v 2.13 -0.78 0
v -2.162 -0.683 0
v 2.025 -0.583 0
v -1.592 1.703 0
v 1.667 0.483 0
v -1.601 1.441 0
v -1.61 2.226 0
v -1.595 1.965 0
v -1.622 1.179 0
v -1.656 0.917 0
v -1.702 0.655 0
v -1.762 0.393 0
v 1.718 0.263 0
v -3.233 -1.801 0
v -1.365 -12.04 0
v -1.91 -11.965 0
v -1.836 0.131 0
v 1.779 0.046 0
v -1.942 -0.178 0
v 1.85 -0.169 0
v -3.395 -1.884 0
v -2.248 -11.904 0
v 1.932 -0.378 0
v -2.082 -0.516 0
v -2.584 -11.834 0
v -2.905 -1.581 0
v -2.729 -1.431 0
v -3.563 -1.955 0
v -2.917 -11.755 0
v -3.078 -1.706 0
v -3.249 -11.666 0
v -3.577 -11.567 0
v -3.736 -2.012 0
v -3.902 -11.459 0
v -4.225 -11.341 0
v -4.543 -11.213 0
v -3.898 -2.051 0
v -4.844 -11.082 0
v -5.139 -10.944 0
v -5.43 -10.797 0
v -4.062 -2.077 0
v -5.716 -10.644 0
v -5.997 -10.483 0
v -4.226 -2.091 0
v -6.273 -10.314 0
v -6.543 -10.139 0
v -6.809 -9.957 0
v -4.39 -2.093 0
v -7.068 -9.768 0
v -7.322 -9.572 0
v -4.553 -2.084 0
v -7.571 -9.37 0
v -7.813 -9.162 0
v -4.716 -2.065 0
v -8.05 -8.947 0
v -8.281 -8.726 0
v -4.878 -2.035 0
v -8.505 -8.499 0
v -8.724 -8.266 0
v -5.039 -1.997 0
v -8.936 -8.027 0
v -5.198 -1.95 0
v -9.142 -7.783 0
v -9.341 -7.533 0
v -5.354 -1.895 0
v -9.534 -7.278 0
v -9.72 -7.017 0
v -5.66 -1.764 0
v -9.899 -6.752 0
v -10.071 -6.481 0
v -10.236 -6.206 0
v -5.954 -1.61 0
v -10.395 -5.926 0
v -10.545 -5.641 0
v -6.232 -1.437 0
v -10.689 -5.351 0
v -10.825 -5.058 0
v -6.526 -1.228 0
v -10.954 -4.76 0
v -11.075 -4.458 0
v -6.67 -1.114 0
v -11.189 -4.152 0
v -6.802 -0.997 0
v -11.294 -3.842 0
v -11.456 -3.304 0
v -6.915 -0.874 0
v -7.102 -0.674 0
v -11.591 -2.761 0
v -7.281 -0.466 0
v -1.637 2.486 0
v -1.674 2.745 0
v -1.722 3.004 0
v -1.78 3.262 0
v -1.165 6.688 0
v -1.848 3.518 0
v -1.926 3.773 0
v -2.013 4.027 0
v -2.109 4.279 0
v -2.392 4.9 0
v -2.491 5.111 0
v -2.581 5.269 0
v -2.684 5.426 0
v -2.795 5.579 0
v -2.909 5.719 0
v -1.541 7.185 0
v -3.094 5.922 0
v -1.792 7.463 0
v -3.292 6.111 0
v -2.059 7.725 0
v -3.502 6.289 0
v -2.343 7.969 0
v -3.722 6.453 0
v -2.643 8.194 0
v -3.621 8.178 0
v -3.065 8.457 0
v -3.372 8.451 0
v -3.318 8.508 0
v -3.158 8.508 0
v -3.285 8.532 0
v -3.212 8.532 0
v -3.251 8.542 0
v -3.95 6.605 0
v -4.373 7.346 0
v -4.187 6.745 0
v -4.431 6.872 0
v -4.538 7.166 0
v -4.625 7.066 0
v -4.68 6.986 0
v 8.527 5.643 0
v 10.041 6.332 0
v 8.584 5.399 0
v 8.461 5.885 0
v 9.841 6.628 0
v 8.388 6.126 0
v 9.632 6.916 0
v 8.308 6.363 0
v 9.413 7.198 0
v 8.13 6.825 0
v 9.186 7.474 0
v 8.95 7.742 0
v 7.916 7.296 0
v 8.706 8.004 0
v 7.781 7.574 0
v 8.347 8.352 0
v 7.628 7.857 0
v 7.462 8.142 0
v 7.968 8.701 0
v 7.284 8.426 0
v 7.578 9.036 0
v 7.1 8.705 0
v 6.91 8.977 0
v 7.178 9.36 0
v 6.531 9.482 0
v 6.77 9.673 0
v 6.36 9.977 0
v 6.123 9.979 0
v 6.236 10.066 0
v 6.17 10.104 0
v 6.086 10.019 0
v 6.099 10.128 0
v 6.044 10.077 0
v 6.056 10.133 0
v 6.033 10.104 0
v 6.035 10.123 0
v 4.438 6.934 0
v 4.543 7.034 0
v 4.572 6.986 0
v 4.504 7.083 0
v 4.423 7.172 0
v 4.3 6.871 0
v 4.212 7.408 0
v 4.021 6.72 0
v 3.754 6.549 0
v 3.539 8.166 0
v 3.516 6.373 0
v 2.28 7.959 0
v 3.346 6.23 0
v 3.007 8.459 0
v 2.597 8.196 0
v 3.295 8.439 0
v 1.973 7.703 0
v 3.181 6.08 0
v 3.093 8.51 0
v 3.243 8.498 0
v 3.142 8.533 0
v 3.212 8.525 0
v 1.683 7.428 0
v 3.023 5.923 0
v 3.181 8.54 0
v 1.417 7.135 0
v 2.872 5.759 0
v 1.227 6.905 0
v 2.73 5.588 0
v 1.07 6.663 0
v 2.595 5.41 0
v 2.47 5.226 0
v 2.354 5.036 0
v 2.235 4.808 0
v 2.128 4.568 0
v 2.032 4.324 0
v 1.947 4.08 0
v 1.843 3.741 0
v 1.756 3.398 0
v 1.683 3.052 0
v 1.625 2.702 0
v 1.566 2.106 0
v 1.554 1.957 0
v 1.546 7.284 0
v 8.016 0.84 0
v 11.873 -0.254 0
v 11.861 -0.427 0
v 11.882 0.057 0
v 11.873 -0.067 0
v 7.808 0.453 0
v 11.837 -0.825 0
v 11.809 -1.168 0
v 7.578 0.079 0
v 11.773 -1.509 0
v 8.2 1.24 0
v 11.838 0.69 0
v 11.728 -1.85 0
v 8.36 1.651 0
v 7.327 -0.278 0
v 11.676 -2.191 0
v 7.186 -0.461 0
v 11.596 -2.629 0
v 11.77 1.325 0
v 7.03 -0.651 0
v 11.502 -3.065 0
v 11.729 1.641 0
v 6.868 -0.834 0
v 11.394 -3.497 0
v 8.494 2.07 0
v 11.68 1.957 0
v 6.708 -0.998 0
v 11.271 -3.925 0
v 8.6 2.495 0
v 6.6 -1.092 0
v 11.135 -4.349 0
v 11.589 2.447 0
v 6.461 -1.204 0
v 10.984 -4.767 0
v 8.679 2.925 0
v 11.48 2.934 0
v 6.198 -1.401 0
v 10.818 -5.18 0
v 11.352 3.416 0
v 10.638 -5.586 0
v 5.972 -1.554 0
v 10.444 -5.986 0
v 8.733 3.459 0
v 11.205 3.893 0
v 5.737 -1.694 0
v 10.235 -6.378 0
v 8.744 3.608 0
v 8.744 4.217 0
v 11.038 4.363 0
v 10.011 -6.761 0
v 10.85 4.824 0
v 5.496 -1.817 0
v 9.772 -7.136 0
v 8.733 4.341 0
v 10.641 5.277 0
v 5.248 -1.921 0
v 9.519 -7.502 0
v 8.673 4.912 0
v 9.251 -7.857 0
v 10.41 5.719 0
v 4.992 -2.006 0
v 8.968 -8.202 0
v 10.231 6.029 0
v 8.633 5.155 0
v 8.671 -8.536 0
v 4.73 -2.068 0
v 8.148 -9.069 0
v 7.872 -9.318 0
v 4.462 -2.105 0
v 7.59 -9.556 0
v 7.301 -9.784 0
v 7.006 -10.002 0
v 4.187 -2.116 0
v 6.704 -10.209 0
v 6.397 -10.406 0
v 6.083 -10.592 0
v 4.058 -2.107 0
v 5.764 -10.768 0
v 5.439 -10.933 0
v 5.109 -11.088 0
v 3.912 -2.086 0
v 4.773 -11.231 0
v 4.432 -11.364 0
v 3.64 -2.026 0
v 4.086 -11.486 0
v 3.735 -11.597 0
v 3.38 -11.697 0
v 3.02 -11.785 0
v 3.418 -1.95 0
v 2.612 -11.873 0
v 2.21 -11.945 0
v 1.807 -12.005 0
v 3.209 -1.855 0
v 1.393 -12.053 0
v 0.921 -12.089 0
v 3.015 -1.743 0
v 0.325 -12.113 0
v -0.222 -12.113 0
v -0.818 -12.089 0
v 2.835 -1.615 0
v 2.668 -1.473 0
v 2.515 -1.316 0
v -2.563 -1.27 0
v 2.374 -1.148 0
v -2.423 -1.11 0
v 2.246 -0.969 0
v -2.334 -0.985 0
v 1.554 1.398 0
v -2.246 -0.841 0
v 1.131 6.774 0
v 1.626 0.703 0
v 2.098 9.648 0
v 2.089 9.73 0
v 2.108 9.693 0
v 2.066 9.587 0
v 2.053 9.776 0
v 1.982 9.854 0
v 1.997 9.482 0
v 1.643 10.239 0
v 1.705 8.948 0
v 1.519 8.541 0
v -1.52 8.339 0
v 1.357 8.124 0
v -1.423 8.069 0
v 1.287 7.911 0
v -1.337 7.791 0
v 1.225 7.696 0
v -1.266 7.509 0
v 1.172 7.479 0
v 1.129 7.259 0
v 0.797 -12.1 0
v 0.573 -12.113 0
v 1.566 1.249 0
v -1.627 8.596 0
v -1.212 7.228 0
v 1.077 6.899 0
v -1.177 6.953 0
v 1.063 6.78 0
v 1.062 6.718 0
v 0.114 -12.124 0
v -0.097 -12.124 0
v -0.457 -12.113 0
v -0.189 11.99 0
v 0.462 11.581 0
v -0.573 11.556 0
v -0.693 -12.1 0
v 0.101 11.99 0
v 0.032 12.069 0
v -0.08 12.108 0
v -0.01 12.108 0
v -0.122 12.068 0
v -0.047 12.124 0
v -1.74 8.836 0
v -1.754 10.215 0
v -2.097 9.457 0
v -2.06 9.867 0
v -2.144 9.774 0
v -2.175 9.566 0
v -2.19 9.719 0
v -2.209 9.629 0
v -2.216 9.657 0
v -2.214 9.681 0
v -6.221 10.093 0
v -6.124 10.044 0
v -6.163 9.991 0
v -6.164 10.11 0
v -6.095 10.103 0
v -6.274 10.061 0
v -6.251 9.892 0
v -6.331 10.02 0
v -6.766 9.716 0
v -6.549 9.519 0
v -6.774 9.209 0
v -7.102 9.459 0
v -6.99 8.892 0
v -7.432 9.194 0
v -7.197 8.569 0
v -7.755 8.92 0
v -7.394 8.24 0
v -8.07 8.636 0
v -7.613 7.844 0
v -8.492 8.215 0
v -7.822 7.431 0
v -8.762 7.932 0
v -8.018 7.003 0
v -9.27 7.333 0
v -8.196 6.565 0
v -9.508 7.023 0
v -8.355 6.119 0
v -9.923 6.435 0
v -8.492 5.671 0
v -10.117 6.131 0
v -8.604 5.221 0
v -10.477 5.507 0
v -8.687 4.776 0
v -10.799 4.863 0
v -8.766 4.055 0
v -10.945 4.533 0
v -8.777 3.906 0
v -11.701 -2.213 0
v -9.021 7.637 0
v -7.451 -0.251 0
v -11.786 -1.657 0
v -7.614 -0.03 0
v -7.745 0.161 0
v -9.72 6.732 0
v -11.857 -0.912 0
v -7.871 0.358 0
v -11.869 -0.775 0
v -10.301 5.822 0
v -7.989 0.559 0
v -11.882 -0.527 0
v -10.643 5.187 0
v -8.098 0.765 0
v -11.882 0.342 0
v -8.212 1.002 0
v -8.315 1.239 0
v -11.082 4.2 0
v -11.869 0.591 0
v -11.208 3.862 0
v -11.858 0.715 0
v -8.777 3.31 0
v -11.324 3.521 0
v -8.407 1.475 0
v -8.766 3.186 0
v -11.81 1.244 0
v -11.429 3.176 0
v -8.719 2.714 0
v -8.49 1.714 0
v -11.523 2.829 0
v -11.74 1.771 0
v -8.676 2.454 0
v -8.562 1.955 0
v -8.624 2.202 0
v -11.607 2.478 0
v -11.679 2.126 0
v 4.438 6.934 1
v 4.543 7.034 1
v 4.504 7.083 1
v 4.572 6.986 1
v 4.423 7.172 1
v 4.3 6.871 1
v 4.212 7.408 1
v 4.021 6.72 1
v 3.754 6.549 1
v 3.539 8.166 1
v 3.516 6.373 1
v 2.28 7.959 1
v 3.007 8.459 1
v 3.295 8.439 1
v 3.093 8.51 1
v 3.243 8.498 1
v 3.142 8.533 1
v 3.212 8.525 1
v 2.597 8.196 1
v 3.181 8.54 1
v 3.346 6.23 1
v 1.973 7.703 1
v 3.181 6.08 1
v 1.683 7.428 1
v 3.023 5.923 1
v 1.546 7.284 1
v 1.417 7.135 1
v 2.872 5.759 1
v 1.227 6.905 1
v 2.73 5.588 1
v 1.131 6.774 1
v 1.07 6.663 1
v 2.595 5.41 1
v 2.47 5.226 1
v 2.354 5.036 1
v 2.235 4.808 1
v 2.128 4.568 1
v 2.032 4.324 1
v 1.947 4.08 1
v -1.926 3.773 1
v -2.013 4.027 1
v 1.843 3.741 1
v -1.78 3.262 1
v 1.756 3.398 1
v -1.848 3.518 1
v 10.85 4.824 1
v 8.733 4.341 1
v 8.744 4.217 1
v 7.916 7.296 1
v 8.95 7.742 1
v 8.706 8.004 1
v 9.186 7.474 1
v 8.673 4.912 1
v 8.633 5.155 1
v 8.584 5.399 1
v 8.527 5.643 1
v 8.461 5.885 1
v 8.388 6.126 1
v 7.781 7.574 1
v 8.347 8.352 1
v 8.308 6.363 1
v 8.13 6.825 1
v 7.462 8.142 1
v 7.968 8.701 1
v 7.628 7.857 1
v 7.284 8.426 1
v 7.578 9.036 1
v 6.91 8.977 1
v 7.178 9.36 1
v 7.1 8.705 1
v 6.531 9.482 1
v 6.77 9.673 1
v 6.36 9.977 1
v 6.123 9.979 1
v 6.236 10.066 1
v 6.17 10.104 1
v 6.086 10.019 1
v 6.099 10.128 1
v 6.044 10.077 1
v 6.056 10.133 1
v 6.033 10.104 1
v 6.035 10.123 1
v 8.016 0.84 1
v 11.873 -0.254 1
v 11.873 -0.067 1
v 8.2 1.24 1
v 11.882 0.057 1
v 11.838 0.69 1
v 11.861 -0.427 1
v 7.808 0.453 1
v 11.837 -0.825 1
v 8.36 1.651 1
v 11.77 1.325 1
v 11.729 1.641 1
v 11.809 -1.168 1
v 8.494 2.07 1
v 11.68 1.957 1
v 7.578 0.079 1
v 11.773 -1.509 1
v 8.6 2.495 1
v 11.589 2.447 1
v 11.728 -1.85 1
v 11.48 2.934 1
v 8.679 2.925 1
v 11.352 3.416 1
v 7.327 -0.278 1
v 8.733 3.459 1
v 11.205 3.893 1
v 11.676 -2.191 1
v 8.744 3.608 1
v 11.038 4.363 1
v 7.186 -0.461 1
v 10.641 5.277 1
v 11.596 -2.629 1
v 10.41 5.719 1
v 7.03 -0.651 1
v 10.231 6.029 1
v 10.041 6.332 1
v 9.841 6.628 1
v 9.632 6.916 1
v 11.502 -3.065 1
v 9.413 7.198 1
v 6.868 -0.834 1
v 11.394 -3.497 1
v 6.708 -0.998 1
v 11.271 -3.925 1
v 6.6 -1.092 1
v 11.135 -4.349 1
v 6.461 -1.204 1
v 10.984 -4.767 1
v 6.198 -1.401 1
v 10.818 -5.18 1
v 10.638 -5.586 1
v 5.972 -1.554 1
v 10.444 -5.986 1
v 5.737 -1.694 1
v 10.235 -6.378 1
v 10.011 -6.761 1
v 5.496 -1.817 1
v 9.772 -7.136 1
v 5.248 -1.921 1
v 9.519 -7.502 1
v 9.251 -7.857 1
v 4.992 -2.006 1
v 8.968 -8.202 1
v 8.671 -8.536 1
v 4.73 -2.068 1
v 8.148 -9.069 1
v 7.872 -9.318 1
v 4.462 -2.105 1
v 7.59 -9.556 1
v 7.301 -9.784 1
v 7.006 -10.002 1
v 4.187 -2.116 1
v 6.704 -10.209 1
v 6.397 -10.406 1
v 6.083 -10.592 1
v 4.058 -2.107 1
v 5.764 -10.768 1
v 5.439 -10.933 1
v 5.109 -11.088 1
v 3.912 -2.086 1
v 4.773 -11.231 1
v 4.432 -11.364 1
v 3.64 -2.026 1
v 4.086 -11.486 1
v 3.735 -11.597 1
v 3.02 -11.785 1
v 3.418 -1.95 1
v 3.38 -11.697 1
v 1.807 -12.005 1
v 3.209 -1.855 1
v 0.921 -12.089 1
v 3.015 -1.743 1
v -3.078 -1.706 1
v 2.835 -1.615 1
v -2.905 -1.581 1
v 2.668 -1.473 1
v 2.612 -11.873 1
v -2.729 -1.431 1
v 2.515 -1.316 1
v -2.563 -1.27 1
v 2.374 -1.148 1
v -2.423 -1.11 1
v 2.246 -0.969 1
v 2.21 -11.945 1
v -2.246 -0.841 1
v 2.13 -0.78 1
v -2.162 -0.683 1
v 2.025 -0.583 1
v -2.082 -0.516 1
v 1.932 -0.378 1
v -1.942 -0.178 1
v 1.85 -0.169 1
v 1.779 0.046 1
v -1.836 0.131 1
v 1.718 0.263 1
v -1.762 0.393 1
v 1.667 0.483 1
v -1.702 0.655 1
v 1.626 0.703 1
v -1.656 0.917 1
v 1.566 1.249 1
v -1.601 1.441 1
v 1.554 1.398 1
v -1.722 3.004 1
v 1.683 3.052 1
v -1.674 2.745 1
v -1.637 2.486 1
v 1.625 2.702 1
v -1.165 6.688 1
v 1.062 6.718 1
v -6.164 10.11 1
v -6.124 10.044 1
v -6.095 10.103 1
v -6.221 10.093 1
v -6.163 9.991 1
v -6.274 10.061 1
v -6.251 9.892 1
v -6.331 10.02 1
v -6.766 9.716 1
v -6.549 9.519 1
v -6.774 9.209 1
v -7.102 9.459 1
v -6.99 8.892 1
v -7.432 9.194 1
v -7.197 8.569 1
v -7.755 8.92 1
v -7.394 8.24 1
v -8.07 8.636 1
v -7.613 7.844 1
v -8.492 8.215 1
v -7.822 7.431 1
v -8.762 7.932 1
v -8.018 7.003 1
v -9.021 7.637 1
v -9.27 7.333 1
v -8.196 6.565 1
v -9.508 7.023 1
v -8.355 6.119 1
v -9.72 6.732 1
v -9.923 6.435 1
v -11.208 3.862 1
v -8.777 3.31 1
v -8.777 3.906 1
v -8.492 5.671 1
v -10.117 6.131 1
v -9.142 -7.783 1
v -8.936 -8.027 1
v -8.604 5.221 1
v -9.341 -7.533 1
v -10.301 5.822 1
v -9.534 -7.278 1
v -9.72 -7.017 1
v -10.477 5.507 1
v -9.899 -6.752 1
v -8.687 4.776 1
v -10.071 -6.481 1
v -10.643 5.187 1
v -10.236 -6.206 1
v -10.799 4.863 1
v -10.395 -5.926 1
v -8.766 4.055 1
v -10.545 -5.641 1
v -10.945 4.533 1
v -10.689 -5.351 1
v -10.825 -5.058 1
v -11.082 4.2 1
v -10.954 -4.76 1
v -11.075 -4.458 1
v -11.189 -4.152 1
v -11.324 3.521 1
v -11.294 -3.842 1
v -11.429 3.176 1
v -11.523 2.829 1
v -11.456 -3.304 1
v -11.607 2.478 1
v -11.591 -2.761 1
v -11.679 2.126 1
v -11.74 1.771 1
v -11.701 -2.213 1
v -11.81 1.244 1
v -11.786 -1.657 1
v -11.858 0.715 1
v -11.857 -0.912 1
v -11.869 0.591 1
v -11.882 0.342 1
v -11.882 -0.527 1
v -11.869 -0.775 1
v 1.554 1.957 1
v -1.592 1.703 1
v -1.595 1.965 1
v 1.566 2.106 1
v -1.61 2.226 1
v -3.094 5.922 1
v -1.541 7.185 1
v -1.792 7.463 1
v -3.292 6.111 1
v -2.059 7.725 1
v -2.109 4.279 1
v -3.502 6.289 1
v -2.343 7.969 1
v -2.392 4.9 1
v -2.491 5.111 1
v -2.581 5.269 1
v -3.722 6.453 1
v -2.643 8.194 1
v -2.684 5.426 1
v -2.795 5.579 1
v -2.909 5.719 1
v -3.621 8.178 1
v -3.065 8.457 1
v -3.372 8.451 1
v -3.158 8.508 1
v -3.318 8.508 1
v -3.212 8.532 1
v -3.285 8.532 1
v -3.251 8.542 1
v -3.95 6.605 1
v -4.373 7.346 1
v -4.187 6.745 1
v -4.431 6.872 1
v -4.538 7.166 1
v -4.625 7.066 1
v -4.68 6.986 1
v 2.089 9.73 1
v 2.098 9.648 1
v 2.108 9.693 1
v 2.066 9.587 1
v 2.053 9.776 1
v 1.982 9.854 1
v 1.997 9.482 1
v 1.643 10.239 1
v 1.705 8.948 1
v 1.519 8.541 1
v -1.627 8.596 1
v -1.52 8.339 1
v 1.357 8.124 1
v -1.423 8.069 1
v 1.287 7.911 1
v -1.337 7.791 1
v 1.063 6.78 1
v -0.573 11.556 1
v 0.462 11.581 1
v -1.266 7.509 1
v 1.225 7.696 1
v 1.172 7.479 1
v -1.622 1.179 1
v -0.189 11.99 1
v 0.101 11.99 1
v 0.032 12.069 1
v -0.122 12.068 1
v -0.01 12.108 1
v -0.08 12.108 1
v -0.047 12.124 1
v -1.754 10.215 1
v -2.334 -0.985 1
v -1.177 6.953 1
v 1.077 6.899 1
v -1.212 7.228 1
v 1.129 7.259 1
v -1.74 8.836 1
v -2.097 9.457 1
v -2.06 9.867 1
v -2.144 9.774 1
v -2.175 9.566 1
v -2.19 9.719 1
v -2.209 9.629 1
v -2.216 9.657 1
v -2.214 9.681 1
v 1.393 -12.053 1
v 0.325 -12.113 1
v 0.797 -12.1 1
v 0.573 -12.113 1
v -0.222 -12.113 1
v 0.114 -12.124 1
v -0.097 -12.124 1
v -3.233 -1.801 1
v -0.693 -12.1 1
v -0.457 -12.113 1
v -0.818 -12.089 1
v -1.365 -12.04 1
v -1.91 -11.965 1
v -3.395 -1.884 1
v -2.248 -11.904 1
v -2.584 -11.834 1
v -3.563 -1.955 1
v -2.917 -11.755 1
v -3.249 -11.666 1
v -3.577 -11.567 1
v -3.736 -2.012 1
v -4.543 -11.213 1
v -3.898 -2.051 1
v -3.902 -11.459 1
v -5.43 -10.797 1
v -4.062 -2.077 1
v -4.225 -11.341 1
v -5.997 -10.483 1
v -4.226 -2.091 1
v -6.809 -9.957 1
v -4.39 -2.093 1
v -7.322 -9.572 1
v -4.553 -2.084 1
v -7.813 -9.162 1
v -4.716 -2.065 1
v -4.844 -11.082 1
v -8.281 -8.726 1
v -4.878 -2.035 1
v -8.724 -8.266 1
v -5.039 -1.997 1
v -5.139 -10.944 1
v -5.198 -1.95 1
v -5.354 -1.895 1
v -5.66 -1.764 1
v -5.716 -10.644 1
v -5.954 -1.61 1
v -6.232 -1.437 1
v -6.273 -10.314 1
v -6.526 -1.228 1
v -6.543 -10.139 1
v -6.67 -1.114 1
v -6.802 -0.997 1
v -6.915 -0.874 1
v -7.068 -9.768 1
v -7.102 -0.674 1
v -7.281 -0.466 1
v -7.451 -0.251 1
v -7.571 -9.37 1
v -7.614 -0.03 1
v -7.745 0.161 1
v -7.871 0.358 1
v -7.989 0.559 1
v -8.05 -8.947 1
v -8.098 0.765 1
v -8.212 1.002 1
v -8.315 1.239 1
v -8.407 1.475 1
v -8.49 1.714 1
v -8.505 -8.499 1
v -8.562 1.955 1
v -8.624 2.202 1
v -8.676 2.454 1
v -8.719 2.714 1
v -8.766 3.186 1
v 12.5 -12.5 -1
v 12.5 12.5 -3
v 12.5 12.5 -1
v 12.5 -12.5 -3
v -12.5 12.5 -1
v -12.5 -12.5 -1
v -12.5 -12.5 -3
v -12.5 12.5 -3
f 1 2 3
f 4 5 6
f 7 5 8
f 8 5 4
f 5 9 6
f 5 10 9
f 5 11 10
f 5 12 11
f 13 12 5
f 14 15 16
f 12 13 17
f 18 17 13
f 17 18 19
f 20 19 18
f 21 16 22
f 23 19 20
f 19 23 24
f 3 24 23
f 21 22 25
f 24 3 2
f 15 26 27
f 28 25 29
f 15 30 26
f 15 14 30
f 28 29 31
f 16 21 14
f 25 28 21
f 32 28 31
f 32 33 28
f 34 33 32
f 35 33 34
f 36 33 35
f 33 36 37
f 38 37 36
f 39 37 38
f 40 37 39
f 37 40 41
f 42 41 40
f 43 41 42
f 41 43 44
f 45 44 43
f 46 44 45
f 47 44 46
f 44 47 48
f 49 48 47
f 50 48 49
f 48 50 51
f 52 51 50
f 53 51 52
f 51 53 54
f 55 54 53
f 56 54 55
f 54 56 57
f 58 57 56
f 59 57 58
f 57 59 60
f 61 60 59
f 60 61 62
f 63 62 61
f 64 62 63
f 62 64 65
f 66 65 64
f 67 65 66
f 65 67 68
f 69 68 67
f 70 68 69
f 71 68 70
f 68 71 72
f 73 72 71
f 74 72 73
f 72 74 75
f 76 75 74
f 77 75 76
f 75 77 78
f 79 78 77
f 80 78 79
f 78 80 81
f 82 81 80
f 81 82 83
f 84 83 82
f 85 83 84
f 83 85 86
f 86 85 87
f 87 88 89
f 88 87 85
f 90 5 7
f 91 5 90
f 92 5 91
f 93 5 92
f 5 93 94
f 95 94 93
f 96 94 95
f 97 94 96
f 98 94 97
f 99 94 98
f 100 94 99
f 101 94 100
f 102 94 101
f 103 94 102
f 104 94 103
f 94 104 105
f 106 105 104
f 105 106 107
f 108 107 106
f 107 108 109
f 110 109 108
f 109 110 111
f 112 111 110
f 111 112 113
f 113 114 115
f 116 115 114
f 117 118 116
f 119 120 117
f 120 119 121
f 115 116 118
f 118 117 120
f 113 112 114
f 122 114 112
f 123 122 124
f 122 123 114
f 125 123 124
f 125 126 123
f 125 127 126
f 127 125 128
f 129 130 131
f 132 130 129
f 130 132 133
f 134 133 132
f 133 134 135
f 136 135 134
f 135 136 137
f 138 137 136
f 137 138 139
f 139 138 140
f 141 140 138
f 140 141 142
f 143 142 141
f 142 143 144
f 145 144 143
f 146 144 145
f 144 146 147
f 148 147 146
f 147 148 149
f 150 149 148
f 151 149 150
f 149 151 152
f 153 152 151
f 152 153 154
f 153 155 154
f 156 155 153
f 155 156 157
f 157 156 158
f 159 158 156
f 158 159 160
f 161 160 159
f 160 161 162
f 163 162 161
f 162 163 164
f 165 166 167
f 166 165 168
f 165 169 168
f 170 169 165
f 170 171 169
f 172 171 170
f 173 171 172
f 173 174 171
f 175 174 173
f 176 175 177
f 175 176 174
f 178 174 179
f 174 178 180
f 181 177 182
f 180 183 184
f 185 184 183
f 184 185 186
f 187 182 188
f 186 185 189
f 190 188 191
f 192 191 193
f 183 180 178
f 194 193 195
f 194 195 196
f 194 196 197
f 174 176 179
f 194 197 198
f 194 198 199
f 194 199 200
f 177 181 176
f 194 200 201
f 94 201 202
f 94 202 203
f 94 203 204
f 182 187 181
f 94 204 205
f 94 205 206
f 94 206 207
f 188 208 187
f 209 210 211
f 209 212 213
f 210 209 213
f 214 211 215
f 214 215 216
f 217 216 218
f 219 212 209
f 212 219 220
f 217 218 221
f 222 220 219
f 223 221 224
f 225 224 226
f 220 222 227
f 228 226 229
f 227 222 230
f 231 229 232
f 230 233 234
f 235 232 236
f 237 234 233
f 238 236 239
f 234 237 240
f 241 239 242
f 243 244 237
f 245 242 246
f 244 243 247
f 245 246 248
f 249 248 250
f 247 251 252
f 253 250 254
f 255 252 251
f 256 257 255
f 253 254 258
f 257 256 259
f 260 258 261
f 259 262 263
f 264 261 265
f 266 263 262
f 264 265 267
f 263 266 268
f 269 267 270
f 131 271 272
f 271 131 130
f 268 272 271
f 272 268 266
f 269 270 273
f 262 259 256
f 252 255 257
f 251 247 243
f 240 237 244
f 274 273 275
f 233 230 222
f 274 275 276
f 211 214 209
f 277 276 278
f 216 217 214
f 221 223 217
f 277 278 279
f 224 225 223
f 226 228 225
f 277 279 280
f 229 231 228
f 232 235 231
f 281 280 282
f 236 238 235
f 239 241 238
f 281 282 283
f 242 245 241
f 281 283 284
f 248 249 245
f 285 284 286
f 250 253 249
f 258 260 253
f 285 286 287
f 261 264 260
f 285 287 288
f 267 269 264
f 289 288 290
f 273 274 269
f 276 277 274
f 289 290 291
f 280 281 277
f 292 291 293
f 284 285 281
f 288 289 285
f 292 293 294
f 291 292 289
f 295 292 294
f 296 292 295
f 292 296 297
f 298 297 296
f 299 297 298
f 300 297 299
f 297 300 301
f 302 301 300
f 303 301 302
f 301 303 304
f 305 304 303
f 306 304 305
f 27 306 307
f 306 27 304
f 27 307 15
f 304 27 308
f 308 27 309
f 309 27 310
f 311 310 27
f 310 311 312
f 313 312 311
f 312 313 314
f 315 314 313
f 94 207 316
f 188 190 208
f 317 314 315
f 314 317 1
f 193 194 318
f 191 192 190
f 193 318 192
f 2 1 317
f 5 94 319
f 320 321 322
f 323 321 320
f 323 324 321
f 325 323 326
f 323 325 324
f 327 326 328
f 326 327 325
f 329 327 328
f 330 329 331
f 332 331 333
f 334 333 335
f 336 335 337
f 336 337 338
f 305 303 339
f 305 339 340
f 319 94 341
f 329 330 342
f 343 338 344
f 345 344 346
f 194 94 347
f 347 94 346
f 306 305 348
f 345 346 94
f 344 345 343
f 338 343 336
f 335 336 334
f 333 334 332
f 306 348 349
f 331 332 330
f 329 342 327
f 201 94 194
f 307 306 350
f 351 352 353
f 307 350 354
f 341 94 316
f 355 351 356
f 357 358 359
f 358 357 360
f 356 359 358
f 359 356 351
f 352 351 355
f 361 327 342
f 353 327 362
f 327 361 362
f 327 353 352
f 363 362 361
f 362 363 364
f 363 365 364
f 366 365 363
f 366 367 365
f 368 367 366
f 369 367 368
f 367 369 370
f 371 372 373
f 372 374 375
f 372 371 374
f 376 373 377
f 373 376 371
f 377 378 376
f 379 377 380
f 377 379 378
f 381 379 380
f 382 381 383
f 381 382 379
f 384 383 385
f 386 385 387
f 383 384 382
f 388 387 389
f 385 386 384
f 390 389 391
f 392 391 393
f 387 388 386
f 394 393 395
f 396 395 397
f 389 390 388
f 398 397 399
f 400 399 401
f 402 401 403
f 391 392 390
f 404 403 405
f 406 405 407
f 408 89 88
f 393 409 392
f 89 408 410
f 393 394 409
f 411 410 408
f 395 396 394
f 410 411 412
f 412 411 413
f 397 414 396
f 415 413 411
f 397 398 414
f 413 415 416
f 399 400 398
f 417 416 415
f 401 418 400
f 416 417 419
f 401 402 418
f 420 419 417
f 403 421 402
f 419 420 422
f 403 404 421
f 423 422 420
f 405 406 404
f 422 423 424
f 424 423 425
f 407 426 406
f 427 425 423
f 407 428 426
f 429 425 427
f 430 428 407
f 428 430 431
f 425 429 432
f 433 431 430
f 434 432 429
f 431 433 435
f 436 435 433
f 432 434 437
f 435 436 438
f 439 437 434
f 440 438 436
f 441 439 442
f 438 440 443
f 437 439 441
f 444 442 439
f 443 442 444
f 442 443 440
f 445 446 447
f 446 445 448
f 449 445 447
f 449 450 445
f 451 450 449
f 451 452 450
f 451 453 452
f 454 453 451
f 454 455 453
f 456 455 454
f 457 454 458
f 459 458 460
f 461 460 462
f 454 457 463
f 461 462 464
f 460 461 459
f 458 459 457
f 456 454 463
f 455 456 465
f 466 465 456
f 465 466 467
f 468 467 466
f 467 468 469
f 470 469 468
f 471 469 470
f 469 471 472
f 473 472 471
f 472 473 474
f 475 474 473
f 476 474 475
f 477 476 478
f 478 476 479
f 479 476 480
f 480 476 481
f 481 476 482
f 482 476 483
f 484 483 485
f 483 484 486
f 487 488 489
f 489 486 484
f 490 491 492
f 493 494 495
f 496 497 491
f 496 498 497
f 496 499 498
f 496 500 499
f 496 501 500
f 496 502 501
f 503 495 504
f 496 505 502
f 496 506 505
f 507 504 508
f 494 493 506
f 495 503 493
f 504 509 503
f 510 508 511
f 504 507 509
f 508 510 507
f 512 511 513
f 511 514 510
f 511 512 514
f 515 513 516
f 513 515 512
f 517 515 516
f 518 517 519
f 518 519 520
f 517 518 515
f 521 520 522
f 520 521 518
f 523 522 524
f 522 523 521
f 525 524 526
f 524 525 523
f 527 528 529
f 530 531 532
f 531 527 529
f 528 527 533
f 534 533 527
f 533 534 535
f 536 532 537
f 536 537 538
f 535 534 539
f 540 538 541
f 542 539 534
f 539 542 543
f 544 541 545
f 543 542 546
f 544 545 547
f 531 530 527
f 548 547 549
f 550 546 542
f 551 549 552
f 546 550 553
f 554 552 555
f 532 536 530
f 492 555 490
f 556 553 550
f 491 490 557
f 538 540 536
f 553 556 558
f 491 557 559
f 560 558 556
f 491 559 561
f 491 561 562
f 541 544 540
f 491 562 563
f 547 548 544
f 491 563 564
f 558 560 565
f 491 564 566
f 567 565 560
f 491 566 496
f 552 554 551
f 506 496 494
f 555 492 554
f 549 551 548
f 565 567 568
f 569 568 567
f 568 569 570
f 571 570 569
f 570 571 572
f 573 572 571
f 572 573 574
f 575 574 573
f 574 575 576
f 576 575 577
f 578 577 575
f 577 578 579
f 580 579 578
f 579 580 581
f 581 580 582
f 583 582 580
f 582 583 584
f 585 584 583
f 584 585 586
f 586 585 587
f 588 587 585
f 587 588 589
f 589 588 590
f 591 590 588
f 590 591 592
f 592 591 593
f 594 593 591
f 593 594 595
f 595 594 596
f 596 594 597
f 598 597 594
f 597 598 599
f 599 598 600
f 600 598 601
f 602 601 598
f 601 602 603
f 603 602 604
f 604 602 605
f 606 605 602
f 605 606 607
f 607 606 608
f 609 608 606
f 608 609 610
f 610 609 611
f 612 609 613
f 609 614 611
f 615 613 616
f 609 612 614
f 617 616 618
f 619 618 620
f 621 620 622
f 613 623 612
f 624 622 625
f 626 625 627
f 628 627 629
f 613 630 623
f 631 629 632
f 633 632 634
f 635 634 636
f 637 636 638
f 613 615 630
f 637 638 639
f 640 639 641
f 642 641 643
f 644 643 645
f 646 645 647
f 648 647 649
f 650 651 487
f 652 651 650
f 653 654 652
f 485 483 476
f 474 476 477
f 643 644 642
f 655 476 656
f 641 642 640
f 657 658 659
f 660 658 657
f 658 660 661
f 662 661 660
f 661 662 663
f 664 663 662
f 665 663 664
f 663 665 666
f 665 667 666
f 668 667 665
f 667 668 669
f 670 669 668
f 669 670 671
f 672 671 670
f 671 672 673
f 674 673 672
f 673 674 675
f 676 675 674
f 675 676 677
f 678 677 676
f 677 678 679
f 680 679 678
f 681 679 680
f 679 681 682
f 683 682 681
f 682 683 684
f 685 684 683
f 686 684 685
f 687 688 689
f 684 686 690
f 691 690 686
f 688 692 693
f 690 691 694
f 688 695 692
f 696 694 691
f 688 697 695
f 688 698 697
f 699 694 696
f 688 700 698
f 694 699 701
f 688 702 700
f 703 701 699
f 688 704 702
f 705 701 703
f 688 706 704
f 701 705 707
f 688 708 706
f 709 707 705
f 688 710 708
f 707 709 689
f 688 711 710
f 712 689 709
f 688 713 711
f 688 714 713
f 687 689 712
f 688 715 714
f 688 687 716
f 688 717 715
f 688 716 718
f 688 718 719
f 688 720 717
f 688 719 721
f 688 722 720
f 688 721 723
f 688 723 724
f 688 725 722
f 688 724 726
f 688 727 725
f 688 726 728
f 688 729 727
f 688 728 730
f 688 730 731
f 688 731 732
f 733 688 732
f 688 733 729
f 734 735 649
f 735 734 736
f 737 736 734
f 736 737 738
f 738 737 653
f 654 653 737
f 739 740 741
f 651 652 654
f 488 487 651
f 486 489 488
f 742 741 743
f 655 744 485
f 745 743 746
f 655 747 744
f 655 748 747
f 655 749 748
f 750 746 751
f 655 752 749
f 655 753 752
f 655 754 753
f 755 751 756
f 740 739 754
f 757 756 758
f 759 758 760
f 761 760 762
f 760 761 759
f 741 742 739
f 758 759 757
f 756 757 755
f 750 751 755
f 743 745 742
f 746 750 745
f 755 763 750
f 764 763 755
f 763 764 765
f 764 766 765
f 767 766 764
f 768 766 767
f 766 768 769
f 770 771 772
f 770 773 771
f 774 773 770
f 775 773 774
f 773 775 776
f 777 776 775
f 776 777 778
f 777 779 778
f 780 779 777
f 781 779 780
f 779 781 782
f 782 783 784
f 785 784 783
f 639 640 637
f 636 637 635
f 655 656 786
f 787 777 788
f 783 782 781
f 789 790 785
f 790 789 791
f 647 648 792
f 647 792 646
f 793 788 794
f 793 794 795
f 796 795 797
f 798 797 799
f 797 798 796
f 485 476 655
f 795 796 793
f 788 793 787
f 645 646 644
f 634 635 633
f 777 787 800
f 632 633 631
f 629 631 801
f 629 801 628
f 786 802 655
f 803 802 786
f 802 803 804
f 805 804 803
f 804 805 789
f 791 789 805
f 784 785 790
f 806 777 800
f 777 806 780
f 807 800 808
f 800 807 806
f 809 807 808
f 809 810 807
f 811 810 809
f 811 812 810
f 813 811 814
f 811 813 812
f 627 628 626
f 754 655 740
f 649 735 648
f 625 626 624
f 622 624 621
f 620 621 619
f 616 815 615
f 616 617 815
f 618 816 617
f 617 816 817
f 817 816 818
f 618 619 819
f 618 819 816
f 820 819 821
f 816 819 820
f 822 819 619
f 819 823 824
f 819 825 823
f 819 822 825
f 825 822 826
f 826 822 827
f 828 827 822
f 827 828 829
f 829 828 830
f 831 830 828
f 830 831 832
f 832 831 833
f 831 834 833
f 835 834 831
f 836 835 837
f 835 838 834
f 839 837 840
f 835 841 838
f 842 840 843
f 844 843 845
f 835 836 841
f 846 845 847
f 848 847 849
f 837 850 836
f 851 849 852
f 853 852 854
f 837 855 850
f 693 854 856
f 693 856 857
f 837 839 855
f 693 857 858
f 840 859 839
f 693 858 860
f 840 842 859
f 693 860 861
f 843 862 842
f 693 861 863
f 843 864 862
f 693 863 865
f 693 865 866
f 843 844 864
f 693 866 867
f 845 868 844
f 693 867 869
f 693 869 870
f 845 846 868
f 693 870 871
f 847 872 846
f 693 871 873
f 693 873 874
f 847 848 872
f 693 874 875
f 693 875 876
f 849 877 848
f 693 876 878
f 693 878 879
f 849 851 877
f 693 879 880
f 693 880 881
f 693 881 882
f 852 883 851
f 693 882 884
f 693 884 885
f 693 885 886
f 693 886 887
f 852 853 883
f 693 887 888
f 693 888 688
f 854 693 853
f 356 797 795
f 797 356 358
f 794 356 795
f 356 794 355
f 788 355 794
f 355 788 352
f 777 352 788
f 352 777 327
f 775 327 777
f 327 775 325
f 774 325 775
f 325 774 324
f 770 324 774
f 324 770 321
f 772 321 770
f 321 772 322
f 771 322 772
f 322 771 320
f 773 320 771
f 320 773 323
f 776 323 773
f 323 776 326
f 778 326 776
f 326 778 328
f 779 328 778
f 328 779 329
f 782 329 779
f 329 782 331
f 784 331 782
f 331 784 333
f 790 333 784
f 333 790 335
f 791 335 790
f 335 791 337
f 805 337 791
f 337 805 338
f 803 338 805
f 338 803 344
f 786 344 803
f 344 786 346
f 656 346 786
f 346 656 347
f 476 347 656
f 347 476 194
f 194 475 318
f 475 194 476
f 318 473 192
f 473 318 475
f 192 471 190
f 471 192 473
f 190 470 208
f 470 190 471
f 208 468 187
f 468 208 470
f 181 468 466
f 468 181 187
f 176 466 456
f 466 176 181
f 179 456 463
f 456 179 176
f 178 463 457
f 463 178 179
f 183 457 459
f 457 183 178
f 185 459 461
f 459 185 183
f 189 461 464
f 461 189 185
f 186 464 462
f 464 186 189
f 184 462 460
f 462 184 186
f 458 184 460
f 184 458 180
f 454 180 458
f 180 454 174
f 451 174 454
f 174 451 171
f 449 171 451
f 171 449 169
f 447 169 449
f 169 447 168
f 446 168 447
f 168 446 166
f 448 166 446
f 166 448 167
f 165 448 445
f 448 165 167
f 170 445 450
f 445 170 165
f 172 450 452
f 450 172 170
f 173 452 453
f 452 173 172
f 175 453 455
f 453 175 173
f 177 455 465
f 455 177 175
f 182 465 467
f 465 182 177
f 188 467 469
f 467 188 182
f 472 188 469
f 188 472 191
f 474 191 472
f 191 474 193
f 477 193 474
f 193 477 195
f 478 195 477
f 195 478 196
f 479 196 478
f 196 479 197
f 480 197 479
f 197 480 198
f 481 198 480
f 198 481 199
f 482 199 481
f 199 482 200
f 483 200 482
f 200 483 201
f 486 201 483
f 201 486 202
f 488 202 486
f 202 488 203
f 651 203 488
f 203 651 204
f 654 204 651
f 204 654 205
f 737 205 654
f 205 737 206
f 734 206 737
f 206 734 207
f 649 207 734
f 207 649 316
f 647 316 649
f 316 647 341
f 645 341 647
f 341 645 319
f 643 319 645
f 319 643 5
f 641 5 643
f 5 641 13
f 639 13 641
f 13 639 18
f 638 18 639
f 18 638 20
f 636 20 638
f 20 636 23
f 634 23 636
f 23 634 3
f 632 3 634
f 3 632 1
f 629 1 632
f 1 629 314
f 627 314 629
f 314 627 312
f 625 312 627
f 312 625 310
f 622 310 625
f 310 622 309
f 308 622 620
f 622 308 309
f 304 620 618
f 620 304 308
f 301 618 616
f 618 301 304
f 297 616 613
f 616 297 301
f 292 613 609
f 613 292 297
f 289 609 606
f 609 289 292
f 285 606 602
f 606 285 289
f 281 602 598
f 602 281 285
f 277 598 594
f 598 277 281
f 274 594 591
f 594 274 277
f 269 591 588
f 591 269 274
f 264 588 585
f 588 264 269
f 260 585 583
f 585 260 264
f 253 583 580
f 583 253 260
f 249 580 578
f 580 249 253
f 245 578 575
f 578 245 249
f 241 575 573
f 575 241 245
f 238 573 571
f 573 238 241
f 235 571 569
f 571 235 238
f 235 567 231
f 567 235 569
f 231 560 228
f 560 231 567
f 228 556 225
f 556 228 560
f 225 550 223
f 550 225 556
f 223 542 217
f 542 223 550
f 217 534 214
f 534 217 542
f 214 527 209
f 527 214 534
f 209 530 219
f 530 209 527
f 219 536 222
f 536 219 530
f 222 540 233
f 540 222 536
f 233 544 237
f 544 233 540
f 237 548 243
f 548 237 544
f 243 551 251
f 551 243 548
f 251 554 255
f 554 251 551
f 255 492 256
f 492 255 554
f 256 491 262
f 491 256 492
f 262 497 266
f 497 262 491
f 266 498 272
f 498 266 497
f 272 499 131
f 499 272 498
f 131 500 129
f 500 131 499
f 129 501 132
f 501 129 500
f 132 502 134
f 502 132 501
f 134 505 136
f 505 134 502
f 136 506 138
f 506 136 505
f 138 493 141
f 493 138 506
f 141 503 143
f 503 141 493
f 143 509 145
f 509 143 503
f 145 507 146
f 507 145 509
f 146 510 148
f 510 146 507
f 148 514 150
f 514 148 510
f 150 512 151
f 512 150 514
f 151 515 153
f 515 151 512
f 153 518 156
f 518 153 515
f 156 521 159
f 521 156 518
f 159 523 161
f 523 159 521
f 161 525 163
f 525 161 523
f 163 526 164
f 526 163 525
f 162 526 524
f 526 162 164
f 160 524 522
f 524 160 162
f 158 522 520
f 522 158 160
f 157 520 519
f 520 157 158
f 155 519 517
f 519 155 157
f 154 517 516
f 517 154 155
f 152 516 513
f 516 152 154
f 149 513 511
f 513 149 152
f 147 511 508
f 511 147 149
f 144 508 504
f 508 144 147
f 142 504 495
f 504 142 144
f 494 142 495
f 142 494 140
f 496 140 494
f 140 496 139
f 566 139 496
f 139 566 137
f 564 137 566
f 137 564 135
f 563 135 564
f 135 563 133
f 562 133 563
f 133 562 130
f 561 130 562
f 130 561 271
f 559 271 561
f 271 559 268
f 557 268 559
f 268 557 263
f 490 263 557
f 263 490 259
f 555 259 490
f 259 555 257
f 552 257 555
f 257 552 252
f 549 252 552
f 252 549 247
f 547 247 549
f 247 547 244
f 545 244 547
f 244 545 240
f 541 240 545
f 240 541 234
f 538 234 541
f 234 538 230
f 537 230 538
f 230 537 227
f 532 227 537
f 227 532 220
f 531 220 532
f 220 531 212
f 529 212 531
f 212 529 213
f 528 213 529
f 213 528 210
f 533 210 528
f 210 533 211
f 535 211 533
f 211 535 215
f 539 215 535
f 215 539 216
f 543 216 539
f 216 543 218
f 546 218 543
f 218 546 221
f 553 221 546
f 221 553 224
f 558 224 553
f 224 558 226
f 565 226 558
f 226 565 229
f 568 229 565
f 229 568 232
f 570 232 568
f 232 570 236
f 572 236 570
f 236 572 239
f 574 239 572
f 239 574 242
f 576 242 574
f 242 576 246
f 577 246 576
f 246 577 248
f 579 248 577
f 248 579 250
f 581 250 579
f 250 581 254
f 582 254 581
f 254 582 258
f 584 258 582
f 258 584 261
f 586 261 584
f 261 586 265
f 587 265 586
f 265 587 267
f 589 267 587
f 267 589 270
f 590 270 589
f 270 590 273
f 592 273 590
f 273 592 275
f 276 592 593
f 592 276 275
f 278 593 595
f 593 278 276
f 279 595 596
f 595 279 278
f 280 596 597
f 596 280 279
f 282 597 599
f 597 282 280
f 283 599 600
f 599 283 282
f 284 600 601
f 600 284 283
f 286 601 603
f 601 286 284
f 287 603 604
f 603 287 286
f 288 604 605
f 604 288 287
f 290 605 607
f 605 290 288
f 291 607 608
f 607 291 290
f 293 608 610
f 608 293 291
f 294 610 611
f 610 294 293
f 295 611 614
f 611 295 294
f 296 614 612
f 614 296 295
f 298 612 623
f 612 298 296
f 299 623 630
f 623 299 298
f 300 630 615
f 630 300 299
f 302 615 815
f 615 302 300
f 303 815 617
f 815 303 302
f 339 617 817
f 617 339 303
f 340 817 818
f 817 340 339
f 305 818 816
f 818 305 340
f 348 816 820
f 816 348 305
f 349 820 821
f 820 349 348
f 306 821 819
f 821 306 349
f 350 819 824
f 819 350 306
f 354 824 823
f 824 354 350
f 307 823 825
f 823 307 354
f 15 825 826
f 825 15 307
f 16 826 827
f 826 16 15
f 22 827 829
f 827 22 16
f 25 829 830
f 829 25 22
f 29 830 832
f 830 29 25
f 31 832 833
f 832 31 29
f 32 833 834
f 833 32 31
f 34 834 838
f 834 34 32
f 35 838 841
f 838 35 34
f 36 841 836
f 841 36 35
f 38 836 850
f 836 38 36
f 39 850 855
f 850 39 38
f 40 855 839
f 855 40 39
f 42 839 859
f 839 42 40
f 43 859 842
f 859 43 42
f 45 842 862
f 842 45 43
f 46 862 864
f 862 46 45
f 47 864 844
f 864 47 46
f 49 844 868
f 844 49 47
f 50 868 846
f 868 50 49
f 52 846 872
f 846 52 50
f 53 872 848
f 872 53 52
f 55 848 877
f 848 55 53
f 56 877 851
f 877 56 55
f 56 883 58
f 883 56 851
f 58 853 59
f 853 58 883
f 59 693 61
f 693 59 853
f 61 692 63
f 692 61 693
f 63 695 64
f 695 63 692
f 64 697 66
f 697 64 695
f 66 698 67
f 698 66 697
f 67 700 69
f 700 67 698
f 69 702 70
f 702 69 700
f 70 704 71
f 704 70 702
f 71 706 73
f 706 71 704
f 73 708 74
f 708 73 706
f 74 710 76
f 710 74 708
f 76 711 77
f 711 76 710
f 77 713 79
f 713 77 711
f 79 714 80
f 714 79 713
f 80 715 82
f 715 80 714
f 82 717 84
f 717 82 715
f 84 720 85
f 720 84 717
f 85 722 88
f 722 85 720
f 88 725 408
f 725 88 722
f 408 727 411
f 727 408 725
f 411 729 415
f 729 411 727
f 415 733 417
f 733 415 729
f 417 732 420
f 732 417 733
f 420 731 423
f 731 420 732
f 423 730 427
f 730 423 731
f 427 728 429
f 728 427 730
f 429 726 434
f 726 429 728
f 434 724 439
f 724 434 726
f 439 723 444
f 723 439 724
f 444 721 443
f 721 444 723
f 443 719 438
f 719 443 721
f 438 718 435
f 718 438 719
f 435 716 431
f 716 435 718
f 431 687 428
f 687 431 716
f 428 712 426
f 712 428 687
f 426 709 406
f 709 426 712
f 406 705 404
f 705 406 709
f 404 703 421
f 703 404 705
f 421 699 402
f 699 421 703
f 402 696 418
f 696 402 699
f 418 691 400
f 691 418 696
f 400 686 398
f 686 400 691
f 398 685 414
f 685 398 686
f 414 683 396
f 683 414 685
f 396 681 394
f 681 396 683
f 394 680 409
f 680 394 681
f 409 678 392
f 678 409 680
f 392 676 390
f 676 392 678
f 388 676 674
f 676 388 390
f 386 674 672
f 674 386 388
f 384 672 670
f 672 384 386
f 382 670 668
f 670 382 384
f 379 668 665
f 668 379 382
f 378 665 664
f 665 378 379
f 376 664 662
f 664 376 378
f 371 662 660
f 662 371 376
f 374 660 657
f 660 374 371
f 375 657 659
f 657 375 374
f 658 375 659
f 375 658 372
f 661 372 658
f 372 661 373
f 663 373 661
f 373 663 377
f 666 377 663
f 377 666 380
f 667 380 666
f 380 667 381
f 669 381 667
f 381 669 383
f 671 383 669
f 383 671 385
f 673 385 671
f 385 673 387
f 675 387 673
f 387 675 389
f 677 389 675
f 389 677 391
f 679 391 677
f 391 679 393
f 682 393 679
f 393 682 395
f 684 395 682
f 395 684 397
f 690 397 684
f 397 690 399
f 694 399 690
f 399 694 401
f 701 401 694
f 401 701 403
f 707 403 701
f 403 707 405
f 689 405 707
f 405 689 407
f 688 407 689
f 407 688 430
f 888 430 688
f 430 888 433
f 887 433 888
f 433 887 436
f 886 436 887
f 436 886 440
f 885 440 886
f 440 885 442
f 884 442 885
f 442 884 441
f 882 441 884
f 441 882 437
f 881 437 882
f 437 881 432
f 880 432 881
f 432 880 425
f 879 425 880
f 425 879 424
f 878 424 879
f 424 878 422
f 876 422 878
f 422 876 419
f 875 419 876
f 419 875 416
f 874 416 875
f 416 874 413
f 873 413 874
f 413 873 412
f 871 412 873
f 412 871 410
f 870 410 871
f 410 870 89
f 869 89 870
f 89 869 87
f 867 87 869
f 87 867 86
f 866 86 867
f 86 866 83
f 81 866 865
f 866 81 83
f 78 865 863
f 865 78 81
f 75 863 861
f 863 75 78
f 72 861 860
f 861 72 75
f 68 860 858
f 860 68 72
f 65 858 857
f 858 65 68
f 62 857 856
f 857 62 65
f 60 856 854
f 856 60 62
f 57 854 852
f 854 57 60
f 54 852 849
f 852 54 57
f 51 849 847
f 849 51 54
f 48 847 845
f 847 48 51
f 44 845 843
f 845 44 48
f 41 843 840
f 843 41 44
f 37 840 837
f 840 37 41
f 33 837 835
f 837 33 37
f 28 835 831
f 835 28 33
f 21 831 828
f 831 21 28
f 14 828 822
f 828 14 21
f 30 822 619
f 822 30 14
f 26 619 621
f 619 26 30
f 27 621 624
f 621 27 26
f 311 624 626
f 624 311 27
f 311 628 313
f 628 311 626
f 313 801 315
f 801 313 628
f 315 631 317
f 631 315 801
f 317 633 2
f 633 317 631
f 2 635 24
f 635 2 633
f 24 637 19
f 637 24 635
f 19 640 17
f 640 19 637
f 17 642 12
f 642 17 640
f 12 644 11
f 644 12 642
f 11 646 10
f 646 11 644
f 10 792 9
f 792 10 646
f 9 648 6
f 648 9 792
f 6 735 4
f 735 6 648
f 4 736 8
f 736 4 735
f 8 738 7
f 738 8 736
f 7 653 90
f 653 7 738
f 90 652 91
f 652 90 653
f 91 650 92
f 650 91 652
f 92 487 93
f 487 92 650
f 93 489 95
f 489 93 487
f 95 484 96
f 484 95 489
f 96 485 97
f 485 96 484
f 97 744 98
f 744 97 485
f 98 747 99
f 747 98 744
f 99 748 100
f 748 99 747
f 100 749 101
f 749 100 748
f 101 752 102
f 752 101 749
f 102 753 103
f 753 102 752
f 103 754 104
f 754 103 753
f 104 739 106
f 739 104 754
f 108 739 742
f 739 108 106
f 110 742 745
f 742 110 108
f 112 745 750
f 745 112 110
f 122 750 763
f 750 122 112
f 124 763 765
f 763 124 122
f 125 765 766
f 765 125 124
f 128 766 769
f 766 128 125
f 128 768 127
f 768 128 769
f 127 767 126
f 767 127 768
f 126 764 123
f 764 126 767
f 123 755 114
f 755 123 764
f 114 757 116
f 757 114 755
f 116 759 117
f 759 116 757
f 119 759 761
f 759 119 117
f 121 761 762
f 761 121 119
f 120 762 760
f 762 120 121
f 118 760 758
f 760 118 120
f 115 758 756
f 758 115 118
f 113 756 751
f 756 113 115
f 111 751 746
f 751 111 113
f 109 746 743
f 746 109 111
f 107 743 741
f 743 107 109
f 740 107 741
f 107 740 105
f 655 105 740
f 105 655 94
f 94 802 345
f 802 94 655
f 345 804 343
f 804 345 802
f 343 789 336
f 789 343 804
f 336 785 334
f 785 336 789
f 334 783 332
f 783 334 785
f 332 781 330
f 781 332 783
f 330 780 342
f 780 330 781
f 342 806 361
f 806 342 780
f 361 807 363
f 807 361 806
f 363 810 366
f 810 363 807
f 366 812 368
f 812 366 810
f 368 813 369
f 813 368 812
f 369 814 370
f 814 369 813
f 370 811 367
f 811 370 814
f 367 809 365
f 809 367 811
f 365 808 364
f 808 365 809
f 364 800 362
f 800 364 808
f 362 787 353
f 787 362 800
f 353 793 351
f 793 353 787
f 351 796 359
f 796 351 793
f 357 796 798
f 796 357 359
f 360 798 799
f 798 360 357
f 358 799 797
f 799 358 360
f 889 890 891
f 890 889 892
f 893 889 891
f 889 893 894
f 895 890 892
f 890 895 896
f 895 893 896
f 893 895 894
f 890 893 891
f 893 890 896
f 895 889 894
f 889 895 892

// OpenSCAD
// file: ../thumbnail-background.scad
module thumbnailBackground()
{
	color("green")
	translate([0, 0, -2])
	cube([25, 25, 2], center=true);	
}
// main file
use <rebel-alliance.scad>
use <../thumbnail-background.scad>

rebelAllianceThumbnail();

thumbnailBackground();
